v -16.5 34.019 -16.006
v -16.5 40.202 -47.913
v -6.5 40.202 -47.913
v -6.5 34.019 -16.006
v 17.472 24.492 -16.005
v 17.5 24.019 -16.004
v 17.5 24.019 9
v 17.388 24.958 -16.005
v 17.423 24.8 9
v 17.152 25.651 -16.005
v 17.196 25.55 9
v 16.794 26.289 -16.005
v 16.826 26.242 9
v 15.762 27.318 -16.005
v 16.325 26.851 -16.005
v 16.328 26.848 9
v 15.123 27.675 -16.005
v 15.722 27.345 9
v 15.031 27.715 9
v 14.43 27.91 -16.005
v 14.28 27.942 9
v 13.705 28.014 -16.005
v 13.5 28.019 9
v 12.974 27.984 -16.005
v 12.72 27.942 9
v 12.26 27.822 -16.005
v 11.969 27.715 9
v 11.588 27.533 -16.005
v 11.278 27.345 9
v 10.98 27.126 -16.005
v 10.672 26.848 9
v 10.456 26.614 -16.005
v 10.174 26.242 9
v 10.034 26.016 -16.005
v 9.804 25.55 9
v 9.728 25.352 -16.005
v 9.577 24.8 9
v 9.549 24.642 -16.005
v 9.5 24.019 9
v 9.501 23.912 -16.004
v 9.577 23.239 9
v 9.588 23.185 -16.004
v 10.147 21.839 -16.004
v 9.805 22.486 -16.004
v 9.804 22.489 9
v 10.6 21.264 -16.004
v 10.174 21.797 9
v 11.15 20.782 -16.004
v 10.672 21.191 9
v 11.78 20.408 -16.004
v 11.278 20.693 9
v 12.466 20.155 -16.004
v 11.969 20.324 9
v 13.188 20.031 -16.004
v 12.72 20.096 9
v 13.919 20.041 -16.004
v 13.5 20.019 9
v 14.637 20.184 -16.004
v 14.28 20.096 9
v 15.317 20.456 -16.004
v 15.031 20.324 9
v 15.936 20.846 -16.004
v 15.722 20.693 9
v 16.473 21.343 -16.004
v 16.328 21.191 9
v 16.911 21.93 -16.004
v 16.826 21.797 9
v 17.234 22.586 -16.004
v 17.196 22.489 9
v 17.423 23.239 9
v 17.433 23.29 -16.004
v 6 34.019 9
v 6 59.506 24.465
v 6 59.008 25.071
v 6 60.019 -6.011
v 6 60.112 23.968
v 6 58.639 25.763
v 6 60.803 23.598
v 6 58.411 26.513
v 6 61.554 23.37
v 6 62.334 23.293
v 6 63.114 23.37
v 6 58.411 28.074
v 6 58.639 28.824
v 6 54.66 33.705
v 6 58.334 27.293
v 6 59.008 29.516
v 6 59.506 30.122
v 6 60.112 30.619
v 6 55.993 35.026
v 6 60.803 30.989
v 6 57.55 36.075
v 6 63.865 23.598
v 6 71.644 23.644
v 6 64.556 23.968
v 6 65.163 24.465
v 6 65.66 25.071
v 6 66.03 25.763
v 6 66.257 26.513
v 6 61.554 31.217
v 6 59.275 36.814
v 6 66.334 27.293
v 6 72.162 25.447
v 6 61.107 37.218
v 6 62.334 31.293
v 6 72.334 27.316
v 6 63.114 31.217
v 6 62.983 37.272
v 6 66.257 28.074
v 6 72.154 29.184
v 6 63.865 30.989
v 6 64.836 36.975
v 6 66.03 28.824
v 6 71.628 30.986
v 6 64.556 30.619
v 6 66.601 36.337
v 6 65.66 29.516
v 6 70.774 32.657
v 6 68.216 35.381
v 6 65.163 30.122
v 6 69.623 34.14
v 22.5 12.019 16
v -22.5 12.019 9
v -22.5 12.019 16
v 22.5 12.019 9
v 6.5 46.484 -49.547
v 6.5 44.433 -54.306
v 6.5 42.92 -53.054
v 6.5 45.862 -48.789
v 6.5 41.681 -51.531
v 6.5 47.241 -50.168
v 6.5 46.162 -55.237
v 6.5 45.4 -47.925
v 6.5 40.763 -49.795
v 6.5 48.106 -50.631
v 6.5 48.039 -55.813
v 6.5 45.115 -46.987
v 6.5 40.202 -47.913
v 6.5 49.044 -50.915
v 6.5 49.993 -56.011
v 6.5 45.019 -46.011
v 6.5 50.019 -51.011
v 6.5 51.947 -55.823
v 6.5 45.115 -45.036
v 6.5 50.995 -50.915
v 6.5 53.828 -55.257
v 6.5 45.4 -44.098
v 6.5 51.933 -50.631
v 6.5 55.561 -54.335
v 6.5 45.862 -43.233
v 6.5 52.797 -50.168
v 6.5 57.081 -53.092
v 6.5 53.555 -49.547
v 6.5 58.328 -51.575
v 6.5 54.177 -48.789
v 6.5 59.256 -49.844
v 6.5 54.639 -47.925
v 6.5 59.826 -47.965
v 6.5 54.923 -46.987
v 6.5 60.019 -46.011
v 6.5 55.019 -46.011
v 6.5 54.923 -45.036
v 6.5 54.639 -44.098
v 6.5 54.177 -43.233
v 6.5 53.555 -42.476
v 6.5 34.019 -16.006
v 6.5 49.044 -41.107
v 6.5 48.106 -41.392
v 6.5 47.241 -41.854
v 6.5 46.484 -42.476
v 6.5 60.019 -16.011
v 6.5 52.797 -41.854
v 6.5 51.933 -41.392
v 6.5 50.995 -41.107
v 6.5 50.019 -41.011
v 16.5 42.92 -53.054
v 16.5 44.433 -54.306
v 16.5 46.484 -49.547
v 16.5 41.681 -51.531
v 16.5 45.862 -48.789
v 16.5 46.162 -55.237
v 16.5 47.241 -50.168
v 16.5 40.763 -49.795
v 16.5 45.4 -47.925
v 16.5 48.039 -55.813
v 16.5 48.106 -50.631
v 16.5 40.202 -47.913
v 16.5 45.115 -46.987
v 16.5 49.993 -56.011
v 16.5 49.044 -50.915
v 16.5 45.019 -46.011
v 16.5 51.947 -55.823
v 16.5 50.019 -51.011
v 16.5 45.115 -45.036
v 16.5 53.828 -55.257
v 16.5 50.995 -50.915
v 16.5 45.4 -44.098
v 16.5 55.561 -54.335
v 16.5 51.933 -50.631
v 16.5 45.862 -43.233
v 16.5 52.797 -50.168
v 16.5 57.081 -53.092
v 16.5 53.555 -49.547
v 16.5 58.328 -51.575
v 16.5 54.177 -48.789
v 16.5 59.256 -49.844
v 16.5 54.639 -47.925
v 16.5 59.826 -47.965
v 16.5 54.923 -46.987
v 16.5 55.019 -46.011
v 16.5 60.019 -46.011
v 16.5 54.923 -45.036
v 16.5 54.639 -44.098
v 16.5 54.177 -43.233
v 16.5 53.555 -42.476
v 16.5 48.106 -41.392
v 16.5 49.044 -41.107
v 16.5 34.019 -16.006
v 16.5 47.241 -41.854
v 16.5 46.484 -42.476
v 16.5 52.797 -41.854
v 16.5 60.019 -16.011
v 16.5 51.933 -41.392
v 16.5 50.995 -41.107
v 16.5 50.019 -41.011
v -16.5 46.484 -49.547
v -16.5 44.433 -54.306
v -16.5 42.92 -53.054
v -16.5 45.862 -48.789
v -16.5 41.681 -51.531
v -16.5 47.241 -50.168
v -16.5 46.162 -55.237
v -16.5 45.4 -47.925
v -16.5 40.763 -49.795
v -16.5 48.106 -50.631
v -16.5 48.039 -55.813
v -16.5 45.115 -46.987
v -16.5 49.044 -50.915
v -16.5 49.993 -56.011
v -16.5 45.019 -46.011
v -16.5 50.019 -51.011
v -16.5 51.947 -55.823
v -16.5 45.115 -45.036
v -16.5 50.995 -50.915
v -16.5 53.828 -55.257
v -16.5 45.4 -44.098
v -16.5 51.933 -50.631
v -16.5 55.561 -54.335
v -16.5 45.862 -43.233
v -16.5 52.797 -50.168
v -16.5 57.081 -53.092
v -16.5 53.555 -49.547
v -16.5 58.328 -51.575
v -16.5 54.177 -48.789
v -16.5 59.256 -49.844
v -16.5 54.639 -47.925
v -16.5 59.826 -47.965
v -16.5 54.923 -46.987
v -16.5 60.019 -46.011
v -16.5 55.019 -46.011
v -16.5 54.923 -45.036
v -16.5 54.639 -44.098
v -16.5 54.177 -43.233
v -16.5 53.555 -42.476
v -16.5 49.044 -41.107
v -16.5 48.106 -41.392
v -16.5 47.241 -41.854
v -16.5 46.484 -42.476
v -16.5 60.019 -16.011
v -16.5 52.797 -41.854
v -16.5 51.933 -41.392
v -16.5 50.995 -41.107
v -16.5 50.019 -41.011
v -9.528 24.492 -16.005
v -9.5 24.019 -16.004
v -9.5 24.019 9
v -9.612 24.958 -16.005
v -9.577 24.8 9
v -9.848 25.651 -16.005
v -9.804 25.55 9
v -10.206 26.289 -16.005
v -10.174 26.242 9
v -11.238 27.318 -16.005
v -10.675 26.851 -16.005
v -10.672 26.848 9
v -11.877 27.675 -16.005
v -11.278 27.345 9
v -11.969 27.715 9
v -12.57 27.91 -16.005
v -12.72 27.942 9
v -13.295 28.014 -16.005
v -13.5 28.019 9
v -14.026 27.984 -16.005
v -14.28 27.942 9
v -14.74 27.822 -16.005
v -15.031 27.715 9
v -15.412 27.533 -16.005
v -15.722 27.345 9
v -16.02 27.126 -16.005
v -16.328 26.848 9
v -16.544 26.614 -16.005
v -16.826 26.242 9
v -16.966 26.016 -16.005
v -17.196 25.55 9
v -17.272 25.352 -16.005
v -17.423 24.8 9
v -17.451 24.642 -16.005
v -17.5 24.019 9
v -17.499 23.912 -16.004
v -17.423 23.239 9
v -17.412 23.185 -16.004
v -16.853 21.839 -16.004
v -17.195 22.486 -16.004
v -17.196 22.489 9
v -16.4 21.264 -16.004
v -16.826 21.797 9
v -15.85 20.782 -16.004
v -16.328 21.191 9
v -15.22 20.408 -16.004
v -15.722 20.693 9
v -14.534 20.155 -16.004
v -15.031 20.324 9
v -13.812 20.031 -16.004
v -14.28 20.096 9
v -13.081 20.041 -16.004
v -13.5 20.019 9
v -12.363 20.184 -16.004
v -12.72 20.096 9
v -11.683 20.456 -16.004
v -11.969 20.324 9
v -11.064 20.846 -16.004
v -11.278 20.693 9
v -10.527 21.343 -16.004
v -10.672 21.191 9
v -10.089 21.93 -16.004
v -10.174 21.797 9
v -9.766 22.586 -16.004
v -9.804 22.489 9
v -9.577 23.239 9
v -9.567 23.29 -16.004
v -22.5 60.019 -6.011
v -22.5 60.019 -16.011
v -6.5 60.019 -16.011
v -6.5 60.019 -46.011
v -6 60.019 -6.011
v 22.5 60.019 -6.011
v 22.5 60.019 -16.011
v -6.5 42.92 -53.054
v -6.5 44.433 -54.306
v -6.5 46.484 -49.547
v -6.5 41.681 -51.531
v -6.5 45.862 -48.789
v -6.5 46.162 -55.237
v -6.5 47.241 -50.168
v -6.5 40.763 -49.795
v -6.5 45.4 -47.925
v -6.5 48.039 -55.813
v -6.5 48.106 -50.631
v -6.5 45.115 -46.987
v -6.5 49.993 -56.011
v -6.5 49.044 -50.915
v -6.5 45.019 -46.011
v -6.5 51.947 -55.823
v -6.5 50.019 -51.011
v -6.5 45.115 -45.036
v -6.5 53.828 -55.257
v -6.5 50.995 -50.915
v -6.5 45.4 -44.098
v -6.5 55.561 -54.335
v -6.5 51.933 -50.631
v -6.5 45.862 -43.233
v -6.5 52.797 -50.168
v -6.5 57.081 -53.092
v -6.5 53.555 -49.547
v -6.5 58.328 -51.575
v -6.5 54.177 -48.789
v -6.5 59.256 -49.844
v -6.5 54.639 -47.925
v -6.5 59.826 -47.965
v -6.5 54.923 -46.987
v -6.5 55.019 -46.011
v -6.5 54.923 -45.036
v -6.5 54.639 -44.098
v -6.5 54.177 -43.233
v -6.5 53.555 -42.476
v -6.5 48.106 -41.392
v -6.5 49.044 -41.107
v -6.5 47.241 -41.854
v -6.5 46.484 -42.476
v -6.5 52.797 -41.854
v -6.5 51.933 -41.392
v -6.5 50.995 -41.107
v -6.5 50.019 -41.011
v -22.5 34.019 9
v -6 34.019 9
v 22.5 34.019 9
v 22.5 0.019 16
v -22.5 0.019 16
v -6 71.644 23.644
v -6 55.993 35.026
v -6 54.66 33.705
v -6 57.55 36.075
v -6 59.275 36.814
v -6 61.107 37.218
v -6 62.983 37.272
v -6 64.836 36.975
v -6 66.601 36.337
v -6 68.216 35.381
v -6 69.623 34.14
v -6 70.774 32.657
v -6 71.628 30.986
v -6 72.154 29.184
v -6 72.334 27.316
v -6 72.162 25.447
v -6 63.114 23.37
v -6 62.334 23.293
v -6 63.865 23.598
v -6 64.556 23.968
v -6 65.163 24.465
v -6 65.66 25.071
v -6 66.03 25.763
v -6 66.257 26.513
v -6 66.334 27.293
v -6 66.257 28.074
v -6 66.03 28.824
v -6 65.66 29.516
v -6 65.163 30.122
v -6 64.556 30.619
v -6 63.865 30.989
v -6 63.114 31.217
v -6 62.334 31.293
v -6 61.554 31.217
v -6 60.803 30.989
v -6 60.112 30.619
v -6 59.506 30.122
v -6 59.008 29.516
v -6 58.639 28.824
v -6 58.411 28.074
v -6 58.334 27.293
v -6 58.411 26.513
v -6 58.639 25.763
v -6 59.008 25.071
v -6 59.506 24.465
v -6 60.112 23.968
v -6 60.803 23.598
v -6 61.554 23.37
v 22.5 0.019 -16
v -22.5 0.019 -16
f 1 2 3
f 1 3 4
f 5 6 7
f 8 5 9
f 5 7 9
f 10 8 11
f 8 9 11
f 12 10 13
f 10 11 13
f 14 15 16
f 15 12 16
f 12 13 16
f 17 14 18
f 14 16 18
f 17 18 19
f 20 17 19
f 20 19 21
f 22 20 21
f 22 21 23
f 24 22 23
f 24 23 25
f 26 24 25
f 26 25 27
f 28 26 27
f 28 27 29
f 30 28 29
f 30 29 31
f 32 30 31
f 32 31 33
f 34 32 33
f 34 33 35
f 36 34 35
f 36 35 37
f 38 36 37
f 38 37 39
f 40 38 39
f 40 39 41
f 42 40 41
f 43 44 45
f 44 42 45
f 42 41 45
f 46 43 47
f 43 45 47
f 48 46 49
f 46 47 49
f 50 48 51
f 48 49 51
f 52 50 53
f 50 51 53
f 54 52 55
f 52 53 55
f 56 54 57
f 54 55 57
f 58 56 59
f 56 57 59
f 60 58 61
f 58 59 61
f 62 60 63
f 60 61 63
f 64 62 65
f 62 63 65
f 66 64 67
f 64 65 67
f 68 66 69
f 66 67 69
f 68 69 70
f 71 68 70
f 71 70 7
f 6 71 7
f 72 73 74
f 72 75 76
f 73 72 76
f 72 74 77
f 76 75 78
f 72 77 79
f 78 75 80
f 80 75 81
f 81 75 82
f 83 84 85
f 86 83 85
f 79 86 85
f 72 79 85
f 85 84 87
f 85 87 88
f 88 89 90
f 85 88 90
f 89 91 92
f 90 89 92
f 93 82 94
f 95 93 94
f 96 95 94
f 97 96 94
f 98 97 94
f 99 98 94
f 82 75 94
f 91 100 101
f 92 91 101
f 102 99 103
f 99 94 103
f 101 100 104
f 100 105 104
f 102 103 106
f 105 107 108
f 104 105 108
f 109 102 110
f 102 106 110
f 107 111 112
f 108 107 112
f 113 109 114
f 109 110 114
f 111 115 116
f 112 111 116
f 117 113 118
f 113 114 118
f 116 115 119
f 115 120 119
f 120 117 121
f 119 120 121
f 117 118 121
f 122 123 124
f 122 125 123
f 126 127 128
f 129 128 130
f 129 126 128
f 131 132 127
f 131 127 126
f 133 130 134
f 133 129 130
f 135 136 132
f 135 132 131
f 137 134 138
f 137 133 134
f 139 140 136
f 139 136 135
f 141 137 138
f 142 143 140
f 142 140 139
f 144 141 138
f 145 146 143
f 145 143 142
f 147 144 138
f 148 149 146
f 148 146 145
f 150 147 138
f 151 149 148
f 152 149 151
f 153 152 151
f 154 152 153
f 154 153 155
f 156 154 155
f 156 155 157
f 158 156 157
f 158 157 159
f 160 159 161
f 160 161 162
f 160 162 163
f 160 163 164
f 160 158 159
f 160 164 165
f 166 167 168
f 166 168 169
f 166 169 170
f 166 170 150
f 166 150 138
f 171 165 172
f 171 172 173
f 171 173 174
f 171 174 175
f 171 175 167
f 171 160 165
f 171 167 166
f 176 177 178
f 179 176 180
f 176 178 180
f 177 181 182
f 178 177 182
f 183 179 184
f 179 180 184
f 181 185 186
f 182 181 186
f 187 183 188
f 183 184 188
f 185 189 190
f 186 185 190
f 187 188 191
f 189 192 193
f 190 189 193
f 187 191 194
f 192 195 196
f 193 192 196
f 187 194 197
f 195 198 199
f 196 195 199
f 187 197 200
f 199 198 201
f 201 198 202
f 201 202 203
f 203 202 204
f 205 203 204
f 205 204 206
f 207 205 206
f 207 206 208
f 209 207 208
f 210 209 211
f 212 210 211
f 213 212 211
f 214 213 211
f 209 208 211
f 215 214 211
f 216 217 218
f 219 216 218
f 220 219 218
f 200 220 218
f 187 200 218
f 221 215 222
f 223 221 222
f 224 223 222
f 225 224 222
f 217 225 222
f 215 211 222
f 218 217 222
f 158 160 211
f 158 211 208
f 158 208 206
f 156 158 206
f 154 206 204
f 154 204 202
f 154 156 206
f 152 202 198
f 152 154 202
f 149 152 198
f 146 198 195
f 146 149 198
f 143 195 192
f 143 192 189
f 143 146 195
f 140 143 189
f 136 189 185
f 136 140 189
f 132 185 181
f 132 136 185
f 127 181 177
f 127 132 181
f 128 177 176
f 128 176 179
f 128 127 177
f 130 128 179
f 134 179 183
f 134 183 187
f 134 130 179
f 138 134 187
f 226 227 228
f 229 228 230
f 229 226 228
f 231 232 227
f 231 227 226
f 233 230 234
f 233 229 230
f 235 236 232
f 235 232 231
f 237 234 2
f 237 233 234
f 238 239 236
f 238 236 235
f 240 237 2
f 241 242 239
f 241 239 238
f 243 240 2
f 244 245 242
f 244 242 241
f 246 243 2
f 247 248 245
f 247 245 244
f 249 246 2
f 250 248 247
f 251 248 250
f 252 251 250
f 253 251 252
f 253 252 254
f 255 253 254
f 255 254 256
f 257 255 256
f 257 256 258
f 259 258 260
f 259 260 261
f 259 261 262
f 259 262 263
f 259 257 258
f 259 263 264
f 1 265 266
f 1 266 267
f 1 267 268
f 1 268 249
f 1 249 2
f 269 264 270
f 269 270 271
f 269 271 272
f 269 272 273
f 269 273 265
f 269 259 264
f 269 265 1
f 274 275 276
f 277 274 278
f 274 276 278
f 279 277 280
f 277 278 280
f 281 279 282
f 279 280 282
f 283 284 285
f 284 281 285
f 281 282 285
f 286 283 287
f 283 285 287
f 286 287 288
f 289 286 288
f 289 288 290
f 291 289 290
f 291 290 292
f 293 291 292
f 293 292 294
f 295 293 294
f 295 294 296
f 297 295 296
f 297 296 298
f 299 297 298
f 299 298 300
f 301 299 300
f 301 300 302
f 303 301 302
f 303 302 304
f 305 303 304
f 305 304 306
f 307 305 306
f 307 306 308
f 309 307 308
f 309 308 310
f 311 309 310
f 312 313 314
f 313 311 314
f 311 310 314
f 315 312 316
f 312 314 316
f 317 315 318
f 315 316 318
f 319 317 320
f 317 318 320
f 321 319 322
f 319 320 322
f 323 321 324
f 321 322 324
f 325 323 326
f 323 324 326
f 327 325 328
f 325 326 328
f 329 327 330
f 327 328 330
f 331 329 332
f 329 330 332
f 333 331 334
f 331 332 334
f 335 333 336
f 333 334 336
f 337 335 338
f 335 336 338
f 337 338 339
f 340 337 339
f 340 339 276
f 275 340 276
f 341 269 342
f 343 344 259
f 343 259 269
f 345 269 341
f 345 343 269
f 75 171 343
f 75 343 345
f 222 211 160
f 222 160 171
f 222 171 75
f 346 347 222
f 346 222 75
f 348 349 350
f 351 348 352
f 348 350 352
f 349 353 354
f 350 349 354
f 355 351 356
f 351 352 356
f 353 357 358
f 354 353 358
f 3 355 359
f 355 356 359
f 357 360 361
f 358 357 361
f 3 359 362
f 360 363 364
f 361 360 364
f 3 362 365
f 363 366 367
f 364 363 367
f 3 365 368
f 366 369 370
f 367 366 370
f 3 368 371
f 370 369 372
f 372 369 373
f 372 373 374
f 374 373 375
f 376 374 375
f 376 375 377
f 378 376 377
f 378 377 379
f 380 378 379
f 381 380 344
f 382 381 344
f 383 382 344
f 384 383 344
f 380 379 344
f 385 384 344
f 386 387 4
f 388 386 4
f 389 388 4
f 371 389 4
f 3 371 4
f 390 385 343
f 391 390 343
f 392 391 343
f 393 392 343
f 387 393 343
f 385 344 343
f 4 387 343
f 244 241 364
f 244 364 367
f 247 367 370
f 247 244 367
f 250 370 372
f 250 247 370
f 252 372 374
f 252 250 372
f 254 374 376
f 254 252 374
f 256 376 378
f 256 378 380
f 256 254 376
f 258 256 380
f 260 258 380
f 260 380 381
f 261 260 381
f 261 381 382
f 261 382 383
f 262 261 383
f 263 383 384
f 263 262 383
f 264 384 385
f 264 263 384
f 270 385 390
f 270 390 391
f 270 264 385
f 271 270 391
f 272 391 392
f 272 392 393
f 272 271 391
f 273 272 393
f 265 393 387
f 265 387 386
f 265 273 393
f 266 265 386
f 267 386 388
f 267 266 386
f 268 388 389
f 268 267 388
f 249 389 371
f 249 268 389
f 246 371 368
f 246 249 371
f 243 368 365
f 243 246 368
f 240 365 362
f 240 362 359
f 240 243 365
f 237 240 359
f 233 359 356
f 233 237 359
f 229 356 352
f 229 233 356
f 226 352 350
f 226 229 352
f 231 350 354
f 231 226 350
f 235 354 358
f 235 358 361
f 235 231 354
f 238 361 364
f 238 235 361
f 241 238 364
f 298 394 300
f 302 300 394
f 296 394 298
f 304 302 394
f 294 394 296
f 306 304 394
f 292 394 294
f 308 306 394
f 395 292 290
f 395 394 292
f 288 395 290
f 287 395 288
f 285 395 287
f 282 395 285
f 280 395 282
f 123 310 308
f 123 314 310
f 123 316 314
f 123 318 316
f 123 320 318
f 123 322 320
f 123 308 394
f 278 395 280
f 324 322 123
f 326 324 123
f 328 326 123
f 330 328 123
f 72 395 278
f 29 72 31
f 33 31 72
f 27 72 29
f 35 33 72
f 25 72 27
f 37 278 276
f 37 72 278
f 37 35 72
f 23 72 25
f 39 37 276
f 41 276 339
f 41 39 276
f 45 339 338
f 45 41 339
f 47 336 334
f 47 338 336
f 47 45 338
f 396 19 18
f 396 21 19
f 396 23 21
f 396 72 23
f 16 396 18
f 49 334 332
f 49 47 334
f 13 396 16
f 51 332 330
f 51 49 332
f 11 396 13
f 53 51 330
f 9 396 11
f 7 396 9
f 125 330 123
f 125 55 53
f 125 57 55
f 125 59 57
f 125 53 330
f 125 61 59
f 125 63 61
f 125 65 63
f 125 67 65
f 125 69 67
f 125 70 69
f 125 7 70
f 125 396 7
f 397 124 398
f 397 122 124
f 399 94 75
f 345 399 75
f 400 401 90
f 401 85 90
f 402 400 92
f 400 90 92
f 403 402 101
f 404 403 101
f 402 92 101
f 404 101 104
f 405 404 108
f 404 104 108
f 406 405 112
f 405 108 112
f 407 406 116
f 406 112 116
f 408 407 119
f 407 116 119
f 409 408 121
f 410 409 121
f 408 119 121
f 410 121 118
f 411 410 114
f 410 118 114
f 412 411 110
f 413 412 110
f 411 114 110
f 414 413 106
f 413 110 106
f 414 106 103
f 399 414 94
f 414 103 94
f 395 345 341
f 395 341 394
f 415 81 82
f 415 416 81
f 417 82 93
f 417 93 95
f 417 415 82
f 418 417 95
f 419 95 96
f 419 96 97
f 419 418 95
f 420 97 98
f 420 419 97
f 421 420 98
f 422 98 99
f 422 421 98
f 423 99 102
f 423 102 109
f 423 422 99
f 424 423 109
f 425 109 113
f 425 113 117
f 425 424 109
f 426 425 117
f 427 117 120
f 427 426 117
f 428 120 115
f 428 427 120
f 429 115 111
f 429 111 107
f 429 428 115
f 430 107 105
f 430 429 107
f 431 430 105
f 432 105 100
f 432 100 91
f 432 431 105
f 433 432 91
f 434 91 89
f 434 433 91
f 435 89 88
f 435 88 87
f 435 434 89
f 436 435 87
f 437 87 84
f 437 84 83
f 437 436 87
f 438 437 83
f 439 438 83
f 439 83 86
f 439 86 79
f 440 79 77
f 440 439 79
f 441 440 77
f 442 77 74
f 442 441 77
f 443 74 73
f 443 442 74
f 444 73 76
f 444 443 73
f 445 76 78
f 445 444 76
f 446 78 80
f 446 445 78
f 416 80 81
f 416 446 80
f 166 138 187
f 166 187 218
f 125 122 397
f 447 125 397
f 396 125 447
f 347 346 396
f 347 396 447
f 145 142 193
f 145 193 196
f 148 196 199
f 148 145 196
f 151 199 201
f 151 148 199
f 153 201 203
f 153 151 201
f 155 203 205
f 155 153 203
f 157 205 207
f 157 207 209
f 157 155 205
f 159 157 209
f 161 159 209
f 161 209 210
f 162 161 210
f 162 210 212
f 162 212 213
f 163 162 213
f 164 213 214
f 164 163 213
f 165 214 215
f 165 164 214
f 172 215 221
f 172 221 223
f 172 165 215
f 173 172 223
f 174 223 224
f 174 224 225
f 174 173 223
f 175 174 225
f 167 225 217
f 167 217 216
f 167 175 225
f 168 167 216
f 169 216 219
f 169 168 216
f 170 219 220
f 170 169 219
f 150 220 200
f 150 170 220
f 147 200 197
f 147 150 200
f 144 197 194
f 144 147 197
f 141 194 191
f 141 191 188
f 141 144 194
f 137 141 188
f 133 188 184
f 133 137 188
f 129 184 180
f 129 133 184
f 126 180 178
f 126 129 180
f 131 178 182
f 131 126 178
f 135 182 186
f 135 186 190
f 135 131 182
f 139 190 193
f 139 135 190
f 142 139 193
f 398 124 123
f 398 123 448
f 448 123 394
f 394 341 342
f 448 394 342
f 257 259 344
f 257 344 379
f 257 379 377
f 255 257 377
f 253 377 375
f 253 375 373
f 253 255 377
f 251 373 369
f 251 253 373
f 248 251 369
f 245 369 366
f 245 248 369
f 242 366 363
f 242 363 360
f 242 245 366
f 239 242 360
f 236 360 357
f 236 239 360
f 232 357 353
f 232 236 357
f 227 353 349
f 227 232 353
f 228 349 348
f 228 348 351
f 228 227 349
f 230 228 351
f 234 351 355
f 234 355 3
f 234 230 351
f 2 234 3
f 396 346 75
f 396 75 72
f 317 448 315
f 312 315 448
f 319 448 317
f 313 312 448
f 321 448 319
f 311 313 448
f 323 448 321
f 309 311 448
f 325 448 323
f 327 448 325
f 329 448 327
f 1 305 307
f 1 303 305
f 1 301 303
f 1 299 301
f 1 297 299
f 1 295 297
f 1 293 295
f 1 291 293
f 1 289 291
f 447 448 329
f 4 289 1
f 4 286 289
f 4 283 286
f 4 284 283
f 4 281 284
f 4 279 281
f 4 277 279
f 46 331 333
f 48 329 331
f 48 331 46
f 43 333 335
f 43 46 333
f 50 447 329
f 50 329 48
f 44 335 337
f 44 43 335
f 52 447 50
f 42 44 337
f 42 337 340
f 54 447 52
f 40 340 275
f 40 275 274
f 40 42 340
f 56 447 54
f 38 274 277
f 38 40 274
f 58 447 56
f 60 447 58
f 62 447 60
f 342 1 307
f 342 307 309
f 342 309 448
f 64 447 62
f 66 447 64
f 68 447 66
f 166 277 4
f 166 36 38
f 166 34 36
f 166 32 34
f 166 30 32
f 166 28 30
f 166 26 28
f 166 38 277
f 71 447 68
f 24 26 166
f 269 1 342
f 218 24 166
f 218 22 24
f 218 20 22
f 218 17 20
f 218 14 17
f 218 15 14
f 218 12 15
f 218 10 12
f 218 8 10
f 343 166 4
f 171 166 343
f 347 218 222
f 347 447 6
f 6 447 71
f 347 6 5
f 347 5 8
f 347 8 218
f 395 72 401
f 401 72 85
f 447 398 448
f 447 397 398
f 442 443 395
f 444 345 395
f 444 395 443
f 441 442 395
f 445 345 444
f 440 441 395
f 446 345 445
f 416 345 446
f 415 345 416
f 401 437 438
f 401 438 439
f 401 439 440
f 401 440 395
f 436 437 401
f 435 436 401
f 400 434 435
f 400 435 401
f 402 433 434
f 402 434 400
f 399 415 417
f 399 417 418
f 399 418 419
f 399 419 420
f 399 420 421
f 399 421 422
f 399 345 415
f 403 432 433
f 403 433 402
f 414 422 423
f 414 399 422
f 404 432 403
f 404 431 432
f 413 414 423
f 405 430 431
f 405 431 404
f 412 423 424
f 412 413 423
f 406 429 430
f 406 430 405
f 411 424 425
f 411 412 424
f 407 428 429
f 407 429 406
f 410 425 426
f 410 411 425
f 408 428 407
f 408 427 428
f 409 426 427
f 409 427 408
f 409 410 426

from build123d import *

# Parameters (mm, degrees)
BOSS_EXTRUDE1_DEPTH = 22.5
BOSS_EXTRUDE2_START = 6.5
SKETCH2_R           = 5
BOSS_EXTRUDE2_DEPTH = 10
BOSS_EXTRUDE3_START = -16.5
SKETCH2_2_R         = 5
BOSS_EXTRUDE3_DEPTH = 10
SKETCH3_R           = 4
BOSS_EXTRUDE4_DEPTH = 6
SKETCH4_R           = 4
CUT_EXTRUDE1_DEPTH  = 100.824444172


with BuildPart() as part:
    # Sketch1 → Boss-Extrude1 (new, symmetric)
    with BuildSketch(Plane(origin=(0, 0, 0), x_dir=(0, 0, -1), z_dir=(1, 0, 0))):
        Polygon((-16, 0.019237886), (16, 0.019237886), (16.011106999, 60.019237886), (6.011106999, 60.019237886), (-9, 34.019237886), (-9, 12.019237886), (-16, 12.019237886), align=None)
    extrude(amount=BOSS_EXTRUDE1_DEPTH, both=True)

    # Sketch2 → Boss-Extrude2 (add)
    with BuildSketch(Plane(origin=(0, 0, 0), x_dir=(0, 0, -1), z_dir=(1, 0, 0)).offset(BOSS_EXTRUDE2_START)):
        with BuildLine():
            Line((16.006293966, 34.019238332), (16.011106999, 60.019237886))
            Line((16.011106999, 60.019237886), (46.011106999, 60.019237886))
            ThreePointArc((46.011106999, 60.019237886), (55.965350951, 50.974762528), (47.913412075, 40.201843354))
            Line((47.913412075, 40.201843354), (16.006293966, 34.019238332))
        make_face()
        with Locations((46.011106999, 50.019237886)):
            Circle(SKETCH2_R, mode=Mode.SUBTRACT)
    extrude(amount=BOSS_EXTRUDE2_DEPTH)

    # Sketch2<2> → Boss-Extrude3 (add)
    with BuildSketch(Plane(origin=(0, 0, 0), x_dir=(0, 0, -1), z_dir=(1, 0, 0)).offset(BOSS_EXTRUDE3_START)):
        with BuildLine():
            Line((16.006293966, 34.019238332), (16.011106999, 60.019237886))
            Line((16.011106999, 60.019237886), (46.011106999, 60.019237886))
            ThreePointArc((46.011106999, 60.019237886), (55.965350951, 50.974762528), (47.913412075, 40.201843354))
            Line((47.913412075, 40.201843354), (16.006293966, 34.019238332))
        make_face()
        with Locations((46.011106999, 50.019237886)):
            Circle(SKETCH2_2_R, mode=Mode.SUBTRACT)
    extrude(amount=BOSS_EXTRUDE3_DEPTH)

    # Sketch3 → Boss-Extrude4 (add, symmetric)
    with BuildSketch(Plane(origin=(0, 0, 0), x_dir=(0, 0, -1), z_dir=(1, 0, 0))):
        with BuildLine():
            Line((6.011106999, 60.019237886), (-9, 34.019237886))
            Line((-9, 34.019237886), (-33.705019764, 54.660061974))
            ThreePointArc((-33.705019764, 54.660061974), (-35.89708202, 67.430869171), (-23.643692341, 71.644311323))
            Line((-23.643692341, 71.644311323), (6.011106999, 60.019237886))
        make_face()
        with Locations((-27.293408528, 62.334124872)):
            Circle(SKETCH3_R, mode=Mode.SUBTRACT)
    extrude(amount=BOSS_EXTRUDE4_DEPTH, both=True)

    # Sketch4 → Cut-Extrude1 (cut, through all)
    with BuildSketch(Plane.XY.offset(9)):
        with Locations((-13.5, 24.019237886)):
            Circle(SKETCH4_R)
        with Locations((13.5, 24.019237886)):
            Circle(SKETCH4_R)
    extrude(amount=-CUT_EXTRUDE1_DEPTH, mode=Mode.SUBTRACT)


solid = part.part
